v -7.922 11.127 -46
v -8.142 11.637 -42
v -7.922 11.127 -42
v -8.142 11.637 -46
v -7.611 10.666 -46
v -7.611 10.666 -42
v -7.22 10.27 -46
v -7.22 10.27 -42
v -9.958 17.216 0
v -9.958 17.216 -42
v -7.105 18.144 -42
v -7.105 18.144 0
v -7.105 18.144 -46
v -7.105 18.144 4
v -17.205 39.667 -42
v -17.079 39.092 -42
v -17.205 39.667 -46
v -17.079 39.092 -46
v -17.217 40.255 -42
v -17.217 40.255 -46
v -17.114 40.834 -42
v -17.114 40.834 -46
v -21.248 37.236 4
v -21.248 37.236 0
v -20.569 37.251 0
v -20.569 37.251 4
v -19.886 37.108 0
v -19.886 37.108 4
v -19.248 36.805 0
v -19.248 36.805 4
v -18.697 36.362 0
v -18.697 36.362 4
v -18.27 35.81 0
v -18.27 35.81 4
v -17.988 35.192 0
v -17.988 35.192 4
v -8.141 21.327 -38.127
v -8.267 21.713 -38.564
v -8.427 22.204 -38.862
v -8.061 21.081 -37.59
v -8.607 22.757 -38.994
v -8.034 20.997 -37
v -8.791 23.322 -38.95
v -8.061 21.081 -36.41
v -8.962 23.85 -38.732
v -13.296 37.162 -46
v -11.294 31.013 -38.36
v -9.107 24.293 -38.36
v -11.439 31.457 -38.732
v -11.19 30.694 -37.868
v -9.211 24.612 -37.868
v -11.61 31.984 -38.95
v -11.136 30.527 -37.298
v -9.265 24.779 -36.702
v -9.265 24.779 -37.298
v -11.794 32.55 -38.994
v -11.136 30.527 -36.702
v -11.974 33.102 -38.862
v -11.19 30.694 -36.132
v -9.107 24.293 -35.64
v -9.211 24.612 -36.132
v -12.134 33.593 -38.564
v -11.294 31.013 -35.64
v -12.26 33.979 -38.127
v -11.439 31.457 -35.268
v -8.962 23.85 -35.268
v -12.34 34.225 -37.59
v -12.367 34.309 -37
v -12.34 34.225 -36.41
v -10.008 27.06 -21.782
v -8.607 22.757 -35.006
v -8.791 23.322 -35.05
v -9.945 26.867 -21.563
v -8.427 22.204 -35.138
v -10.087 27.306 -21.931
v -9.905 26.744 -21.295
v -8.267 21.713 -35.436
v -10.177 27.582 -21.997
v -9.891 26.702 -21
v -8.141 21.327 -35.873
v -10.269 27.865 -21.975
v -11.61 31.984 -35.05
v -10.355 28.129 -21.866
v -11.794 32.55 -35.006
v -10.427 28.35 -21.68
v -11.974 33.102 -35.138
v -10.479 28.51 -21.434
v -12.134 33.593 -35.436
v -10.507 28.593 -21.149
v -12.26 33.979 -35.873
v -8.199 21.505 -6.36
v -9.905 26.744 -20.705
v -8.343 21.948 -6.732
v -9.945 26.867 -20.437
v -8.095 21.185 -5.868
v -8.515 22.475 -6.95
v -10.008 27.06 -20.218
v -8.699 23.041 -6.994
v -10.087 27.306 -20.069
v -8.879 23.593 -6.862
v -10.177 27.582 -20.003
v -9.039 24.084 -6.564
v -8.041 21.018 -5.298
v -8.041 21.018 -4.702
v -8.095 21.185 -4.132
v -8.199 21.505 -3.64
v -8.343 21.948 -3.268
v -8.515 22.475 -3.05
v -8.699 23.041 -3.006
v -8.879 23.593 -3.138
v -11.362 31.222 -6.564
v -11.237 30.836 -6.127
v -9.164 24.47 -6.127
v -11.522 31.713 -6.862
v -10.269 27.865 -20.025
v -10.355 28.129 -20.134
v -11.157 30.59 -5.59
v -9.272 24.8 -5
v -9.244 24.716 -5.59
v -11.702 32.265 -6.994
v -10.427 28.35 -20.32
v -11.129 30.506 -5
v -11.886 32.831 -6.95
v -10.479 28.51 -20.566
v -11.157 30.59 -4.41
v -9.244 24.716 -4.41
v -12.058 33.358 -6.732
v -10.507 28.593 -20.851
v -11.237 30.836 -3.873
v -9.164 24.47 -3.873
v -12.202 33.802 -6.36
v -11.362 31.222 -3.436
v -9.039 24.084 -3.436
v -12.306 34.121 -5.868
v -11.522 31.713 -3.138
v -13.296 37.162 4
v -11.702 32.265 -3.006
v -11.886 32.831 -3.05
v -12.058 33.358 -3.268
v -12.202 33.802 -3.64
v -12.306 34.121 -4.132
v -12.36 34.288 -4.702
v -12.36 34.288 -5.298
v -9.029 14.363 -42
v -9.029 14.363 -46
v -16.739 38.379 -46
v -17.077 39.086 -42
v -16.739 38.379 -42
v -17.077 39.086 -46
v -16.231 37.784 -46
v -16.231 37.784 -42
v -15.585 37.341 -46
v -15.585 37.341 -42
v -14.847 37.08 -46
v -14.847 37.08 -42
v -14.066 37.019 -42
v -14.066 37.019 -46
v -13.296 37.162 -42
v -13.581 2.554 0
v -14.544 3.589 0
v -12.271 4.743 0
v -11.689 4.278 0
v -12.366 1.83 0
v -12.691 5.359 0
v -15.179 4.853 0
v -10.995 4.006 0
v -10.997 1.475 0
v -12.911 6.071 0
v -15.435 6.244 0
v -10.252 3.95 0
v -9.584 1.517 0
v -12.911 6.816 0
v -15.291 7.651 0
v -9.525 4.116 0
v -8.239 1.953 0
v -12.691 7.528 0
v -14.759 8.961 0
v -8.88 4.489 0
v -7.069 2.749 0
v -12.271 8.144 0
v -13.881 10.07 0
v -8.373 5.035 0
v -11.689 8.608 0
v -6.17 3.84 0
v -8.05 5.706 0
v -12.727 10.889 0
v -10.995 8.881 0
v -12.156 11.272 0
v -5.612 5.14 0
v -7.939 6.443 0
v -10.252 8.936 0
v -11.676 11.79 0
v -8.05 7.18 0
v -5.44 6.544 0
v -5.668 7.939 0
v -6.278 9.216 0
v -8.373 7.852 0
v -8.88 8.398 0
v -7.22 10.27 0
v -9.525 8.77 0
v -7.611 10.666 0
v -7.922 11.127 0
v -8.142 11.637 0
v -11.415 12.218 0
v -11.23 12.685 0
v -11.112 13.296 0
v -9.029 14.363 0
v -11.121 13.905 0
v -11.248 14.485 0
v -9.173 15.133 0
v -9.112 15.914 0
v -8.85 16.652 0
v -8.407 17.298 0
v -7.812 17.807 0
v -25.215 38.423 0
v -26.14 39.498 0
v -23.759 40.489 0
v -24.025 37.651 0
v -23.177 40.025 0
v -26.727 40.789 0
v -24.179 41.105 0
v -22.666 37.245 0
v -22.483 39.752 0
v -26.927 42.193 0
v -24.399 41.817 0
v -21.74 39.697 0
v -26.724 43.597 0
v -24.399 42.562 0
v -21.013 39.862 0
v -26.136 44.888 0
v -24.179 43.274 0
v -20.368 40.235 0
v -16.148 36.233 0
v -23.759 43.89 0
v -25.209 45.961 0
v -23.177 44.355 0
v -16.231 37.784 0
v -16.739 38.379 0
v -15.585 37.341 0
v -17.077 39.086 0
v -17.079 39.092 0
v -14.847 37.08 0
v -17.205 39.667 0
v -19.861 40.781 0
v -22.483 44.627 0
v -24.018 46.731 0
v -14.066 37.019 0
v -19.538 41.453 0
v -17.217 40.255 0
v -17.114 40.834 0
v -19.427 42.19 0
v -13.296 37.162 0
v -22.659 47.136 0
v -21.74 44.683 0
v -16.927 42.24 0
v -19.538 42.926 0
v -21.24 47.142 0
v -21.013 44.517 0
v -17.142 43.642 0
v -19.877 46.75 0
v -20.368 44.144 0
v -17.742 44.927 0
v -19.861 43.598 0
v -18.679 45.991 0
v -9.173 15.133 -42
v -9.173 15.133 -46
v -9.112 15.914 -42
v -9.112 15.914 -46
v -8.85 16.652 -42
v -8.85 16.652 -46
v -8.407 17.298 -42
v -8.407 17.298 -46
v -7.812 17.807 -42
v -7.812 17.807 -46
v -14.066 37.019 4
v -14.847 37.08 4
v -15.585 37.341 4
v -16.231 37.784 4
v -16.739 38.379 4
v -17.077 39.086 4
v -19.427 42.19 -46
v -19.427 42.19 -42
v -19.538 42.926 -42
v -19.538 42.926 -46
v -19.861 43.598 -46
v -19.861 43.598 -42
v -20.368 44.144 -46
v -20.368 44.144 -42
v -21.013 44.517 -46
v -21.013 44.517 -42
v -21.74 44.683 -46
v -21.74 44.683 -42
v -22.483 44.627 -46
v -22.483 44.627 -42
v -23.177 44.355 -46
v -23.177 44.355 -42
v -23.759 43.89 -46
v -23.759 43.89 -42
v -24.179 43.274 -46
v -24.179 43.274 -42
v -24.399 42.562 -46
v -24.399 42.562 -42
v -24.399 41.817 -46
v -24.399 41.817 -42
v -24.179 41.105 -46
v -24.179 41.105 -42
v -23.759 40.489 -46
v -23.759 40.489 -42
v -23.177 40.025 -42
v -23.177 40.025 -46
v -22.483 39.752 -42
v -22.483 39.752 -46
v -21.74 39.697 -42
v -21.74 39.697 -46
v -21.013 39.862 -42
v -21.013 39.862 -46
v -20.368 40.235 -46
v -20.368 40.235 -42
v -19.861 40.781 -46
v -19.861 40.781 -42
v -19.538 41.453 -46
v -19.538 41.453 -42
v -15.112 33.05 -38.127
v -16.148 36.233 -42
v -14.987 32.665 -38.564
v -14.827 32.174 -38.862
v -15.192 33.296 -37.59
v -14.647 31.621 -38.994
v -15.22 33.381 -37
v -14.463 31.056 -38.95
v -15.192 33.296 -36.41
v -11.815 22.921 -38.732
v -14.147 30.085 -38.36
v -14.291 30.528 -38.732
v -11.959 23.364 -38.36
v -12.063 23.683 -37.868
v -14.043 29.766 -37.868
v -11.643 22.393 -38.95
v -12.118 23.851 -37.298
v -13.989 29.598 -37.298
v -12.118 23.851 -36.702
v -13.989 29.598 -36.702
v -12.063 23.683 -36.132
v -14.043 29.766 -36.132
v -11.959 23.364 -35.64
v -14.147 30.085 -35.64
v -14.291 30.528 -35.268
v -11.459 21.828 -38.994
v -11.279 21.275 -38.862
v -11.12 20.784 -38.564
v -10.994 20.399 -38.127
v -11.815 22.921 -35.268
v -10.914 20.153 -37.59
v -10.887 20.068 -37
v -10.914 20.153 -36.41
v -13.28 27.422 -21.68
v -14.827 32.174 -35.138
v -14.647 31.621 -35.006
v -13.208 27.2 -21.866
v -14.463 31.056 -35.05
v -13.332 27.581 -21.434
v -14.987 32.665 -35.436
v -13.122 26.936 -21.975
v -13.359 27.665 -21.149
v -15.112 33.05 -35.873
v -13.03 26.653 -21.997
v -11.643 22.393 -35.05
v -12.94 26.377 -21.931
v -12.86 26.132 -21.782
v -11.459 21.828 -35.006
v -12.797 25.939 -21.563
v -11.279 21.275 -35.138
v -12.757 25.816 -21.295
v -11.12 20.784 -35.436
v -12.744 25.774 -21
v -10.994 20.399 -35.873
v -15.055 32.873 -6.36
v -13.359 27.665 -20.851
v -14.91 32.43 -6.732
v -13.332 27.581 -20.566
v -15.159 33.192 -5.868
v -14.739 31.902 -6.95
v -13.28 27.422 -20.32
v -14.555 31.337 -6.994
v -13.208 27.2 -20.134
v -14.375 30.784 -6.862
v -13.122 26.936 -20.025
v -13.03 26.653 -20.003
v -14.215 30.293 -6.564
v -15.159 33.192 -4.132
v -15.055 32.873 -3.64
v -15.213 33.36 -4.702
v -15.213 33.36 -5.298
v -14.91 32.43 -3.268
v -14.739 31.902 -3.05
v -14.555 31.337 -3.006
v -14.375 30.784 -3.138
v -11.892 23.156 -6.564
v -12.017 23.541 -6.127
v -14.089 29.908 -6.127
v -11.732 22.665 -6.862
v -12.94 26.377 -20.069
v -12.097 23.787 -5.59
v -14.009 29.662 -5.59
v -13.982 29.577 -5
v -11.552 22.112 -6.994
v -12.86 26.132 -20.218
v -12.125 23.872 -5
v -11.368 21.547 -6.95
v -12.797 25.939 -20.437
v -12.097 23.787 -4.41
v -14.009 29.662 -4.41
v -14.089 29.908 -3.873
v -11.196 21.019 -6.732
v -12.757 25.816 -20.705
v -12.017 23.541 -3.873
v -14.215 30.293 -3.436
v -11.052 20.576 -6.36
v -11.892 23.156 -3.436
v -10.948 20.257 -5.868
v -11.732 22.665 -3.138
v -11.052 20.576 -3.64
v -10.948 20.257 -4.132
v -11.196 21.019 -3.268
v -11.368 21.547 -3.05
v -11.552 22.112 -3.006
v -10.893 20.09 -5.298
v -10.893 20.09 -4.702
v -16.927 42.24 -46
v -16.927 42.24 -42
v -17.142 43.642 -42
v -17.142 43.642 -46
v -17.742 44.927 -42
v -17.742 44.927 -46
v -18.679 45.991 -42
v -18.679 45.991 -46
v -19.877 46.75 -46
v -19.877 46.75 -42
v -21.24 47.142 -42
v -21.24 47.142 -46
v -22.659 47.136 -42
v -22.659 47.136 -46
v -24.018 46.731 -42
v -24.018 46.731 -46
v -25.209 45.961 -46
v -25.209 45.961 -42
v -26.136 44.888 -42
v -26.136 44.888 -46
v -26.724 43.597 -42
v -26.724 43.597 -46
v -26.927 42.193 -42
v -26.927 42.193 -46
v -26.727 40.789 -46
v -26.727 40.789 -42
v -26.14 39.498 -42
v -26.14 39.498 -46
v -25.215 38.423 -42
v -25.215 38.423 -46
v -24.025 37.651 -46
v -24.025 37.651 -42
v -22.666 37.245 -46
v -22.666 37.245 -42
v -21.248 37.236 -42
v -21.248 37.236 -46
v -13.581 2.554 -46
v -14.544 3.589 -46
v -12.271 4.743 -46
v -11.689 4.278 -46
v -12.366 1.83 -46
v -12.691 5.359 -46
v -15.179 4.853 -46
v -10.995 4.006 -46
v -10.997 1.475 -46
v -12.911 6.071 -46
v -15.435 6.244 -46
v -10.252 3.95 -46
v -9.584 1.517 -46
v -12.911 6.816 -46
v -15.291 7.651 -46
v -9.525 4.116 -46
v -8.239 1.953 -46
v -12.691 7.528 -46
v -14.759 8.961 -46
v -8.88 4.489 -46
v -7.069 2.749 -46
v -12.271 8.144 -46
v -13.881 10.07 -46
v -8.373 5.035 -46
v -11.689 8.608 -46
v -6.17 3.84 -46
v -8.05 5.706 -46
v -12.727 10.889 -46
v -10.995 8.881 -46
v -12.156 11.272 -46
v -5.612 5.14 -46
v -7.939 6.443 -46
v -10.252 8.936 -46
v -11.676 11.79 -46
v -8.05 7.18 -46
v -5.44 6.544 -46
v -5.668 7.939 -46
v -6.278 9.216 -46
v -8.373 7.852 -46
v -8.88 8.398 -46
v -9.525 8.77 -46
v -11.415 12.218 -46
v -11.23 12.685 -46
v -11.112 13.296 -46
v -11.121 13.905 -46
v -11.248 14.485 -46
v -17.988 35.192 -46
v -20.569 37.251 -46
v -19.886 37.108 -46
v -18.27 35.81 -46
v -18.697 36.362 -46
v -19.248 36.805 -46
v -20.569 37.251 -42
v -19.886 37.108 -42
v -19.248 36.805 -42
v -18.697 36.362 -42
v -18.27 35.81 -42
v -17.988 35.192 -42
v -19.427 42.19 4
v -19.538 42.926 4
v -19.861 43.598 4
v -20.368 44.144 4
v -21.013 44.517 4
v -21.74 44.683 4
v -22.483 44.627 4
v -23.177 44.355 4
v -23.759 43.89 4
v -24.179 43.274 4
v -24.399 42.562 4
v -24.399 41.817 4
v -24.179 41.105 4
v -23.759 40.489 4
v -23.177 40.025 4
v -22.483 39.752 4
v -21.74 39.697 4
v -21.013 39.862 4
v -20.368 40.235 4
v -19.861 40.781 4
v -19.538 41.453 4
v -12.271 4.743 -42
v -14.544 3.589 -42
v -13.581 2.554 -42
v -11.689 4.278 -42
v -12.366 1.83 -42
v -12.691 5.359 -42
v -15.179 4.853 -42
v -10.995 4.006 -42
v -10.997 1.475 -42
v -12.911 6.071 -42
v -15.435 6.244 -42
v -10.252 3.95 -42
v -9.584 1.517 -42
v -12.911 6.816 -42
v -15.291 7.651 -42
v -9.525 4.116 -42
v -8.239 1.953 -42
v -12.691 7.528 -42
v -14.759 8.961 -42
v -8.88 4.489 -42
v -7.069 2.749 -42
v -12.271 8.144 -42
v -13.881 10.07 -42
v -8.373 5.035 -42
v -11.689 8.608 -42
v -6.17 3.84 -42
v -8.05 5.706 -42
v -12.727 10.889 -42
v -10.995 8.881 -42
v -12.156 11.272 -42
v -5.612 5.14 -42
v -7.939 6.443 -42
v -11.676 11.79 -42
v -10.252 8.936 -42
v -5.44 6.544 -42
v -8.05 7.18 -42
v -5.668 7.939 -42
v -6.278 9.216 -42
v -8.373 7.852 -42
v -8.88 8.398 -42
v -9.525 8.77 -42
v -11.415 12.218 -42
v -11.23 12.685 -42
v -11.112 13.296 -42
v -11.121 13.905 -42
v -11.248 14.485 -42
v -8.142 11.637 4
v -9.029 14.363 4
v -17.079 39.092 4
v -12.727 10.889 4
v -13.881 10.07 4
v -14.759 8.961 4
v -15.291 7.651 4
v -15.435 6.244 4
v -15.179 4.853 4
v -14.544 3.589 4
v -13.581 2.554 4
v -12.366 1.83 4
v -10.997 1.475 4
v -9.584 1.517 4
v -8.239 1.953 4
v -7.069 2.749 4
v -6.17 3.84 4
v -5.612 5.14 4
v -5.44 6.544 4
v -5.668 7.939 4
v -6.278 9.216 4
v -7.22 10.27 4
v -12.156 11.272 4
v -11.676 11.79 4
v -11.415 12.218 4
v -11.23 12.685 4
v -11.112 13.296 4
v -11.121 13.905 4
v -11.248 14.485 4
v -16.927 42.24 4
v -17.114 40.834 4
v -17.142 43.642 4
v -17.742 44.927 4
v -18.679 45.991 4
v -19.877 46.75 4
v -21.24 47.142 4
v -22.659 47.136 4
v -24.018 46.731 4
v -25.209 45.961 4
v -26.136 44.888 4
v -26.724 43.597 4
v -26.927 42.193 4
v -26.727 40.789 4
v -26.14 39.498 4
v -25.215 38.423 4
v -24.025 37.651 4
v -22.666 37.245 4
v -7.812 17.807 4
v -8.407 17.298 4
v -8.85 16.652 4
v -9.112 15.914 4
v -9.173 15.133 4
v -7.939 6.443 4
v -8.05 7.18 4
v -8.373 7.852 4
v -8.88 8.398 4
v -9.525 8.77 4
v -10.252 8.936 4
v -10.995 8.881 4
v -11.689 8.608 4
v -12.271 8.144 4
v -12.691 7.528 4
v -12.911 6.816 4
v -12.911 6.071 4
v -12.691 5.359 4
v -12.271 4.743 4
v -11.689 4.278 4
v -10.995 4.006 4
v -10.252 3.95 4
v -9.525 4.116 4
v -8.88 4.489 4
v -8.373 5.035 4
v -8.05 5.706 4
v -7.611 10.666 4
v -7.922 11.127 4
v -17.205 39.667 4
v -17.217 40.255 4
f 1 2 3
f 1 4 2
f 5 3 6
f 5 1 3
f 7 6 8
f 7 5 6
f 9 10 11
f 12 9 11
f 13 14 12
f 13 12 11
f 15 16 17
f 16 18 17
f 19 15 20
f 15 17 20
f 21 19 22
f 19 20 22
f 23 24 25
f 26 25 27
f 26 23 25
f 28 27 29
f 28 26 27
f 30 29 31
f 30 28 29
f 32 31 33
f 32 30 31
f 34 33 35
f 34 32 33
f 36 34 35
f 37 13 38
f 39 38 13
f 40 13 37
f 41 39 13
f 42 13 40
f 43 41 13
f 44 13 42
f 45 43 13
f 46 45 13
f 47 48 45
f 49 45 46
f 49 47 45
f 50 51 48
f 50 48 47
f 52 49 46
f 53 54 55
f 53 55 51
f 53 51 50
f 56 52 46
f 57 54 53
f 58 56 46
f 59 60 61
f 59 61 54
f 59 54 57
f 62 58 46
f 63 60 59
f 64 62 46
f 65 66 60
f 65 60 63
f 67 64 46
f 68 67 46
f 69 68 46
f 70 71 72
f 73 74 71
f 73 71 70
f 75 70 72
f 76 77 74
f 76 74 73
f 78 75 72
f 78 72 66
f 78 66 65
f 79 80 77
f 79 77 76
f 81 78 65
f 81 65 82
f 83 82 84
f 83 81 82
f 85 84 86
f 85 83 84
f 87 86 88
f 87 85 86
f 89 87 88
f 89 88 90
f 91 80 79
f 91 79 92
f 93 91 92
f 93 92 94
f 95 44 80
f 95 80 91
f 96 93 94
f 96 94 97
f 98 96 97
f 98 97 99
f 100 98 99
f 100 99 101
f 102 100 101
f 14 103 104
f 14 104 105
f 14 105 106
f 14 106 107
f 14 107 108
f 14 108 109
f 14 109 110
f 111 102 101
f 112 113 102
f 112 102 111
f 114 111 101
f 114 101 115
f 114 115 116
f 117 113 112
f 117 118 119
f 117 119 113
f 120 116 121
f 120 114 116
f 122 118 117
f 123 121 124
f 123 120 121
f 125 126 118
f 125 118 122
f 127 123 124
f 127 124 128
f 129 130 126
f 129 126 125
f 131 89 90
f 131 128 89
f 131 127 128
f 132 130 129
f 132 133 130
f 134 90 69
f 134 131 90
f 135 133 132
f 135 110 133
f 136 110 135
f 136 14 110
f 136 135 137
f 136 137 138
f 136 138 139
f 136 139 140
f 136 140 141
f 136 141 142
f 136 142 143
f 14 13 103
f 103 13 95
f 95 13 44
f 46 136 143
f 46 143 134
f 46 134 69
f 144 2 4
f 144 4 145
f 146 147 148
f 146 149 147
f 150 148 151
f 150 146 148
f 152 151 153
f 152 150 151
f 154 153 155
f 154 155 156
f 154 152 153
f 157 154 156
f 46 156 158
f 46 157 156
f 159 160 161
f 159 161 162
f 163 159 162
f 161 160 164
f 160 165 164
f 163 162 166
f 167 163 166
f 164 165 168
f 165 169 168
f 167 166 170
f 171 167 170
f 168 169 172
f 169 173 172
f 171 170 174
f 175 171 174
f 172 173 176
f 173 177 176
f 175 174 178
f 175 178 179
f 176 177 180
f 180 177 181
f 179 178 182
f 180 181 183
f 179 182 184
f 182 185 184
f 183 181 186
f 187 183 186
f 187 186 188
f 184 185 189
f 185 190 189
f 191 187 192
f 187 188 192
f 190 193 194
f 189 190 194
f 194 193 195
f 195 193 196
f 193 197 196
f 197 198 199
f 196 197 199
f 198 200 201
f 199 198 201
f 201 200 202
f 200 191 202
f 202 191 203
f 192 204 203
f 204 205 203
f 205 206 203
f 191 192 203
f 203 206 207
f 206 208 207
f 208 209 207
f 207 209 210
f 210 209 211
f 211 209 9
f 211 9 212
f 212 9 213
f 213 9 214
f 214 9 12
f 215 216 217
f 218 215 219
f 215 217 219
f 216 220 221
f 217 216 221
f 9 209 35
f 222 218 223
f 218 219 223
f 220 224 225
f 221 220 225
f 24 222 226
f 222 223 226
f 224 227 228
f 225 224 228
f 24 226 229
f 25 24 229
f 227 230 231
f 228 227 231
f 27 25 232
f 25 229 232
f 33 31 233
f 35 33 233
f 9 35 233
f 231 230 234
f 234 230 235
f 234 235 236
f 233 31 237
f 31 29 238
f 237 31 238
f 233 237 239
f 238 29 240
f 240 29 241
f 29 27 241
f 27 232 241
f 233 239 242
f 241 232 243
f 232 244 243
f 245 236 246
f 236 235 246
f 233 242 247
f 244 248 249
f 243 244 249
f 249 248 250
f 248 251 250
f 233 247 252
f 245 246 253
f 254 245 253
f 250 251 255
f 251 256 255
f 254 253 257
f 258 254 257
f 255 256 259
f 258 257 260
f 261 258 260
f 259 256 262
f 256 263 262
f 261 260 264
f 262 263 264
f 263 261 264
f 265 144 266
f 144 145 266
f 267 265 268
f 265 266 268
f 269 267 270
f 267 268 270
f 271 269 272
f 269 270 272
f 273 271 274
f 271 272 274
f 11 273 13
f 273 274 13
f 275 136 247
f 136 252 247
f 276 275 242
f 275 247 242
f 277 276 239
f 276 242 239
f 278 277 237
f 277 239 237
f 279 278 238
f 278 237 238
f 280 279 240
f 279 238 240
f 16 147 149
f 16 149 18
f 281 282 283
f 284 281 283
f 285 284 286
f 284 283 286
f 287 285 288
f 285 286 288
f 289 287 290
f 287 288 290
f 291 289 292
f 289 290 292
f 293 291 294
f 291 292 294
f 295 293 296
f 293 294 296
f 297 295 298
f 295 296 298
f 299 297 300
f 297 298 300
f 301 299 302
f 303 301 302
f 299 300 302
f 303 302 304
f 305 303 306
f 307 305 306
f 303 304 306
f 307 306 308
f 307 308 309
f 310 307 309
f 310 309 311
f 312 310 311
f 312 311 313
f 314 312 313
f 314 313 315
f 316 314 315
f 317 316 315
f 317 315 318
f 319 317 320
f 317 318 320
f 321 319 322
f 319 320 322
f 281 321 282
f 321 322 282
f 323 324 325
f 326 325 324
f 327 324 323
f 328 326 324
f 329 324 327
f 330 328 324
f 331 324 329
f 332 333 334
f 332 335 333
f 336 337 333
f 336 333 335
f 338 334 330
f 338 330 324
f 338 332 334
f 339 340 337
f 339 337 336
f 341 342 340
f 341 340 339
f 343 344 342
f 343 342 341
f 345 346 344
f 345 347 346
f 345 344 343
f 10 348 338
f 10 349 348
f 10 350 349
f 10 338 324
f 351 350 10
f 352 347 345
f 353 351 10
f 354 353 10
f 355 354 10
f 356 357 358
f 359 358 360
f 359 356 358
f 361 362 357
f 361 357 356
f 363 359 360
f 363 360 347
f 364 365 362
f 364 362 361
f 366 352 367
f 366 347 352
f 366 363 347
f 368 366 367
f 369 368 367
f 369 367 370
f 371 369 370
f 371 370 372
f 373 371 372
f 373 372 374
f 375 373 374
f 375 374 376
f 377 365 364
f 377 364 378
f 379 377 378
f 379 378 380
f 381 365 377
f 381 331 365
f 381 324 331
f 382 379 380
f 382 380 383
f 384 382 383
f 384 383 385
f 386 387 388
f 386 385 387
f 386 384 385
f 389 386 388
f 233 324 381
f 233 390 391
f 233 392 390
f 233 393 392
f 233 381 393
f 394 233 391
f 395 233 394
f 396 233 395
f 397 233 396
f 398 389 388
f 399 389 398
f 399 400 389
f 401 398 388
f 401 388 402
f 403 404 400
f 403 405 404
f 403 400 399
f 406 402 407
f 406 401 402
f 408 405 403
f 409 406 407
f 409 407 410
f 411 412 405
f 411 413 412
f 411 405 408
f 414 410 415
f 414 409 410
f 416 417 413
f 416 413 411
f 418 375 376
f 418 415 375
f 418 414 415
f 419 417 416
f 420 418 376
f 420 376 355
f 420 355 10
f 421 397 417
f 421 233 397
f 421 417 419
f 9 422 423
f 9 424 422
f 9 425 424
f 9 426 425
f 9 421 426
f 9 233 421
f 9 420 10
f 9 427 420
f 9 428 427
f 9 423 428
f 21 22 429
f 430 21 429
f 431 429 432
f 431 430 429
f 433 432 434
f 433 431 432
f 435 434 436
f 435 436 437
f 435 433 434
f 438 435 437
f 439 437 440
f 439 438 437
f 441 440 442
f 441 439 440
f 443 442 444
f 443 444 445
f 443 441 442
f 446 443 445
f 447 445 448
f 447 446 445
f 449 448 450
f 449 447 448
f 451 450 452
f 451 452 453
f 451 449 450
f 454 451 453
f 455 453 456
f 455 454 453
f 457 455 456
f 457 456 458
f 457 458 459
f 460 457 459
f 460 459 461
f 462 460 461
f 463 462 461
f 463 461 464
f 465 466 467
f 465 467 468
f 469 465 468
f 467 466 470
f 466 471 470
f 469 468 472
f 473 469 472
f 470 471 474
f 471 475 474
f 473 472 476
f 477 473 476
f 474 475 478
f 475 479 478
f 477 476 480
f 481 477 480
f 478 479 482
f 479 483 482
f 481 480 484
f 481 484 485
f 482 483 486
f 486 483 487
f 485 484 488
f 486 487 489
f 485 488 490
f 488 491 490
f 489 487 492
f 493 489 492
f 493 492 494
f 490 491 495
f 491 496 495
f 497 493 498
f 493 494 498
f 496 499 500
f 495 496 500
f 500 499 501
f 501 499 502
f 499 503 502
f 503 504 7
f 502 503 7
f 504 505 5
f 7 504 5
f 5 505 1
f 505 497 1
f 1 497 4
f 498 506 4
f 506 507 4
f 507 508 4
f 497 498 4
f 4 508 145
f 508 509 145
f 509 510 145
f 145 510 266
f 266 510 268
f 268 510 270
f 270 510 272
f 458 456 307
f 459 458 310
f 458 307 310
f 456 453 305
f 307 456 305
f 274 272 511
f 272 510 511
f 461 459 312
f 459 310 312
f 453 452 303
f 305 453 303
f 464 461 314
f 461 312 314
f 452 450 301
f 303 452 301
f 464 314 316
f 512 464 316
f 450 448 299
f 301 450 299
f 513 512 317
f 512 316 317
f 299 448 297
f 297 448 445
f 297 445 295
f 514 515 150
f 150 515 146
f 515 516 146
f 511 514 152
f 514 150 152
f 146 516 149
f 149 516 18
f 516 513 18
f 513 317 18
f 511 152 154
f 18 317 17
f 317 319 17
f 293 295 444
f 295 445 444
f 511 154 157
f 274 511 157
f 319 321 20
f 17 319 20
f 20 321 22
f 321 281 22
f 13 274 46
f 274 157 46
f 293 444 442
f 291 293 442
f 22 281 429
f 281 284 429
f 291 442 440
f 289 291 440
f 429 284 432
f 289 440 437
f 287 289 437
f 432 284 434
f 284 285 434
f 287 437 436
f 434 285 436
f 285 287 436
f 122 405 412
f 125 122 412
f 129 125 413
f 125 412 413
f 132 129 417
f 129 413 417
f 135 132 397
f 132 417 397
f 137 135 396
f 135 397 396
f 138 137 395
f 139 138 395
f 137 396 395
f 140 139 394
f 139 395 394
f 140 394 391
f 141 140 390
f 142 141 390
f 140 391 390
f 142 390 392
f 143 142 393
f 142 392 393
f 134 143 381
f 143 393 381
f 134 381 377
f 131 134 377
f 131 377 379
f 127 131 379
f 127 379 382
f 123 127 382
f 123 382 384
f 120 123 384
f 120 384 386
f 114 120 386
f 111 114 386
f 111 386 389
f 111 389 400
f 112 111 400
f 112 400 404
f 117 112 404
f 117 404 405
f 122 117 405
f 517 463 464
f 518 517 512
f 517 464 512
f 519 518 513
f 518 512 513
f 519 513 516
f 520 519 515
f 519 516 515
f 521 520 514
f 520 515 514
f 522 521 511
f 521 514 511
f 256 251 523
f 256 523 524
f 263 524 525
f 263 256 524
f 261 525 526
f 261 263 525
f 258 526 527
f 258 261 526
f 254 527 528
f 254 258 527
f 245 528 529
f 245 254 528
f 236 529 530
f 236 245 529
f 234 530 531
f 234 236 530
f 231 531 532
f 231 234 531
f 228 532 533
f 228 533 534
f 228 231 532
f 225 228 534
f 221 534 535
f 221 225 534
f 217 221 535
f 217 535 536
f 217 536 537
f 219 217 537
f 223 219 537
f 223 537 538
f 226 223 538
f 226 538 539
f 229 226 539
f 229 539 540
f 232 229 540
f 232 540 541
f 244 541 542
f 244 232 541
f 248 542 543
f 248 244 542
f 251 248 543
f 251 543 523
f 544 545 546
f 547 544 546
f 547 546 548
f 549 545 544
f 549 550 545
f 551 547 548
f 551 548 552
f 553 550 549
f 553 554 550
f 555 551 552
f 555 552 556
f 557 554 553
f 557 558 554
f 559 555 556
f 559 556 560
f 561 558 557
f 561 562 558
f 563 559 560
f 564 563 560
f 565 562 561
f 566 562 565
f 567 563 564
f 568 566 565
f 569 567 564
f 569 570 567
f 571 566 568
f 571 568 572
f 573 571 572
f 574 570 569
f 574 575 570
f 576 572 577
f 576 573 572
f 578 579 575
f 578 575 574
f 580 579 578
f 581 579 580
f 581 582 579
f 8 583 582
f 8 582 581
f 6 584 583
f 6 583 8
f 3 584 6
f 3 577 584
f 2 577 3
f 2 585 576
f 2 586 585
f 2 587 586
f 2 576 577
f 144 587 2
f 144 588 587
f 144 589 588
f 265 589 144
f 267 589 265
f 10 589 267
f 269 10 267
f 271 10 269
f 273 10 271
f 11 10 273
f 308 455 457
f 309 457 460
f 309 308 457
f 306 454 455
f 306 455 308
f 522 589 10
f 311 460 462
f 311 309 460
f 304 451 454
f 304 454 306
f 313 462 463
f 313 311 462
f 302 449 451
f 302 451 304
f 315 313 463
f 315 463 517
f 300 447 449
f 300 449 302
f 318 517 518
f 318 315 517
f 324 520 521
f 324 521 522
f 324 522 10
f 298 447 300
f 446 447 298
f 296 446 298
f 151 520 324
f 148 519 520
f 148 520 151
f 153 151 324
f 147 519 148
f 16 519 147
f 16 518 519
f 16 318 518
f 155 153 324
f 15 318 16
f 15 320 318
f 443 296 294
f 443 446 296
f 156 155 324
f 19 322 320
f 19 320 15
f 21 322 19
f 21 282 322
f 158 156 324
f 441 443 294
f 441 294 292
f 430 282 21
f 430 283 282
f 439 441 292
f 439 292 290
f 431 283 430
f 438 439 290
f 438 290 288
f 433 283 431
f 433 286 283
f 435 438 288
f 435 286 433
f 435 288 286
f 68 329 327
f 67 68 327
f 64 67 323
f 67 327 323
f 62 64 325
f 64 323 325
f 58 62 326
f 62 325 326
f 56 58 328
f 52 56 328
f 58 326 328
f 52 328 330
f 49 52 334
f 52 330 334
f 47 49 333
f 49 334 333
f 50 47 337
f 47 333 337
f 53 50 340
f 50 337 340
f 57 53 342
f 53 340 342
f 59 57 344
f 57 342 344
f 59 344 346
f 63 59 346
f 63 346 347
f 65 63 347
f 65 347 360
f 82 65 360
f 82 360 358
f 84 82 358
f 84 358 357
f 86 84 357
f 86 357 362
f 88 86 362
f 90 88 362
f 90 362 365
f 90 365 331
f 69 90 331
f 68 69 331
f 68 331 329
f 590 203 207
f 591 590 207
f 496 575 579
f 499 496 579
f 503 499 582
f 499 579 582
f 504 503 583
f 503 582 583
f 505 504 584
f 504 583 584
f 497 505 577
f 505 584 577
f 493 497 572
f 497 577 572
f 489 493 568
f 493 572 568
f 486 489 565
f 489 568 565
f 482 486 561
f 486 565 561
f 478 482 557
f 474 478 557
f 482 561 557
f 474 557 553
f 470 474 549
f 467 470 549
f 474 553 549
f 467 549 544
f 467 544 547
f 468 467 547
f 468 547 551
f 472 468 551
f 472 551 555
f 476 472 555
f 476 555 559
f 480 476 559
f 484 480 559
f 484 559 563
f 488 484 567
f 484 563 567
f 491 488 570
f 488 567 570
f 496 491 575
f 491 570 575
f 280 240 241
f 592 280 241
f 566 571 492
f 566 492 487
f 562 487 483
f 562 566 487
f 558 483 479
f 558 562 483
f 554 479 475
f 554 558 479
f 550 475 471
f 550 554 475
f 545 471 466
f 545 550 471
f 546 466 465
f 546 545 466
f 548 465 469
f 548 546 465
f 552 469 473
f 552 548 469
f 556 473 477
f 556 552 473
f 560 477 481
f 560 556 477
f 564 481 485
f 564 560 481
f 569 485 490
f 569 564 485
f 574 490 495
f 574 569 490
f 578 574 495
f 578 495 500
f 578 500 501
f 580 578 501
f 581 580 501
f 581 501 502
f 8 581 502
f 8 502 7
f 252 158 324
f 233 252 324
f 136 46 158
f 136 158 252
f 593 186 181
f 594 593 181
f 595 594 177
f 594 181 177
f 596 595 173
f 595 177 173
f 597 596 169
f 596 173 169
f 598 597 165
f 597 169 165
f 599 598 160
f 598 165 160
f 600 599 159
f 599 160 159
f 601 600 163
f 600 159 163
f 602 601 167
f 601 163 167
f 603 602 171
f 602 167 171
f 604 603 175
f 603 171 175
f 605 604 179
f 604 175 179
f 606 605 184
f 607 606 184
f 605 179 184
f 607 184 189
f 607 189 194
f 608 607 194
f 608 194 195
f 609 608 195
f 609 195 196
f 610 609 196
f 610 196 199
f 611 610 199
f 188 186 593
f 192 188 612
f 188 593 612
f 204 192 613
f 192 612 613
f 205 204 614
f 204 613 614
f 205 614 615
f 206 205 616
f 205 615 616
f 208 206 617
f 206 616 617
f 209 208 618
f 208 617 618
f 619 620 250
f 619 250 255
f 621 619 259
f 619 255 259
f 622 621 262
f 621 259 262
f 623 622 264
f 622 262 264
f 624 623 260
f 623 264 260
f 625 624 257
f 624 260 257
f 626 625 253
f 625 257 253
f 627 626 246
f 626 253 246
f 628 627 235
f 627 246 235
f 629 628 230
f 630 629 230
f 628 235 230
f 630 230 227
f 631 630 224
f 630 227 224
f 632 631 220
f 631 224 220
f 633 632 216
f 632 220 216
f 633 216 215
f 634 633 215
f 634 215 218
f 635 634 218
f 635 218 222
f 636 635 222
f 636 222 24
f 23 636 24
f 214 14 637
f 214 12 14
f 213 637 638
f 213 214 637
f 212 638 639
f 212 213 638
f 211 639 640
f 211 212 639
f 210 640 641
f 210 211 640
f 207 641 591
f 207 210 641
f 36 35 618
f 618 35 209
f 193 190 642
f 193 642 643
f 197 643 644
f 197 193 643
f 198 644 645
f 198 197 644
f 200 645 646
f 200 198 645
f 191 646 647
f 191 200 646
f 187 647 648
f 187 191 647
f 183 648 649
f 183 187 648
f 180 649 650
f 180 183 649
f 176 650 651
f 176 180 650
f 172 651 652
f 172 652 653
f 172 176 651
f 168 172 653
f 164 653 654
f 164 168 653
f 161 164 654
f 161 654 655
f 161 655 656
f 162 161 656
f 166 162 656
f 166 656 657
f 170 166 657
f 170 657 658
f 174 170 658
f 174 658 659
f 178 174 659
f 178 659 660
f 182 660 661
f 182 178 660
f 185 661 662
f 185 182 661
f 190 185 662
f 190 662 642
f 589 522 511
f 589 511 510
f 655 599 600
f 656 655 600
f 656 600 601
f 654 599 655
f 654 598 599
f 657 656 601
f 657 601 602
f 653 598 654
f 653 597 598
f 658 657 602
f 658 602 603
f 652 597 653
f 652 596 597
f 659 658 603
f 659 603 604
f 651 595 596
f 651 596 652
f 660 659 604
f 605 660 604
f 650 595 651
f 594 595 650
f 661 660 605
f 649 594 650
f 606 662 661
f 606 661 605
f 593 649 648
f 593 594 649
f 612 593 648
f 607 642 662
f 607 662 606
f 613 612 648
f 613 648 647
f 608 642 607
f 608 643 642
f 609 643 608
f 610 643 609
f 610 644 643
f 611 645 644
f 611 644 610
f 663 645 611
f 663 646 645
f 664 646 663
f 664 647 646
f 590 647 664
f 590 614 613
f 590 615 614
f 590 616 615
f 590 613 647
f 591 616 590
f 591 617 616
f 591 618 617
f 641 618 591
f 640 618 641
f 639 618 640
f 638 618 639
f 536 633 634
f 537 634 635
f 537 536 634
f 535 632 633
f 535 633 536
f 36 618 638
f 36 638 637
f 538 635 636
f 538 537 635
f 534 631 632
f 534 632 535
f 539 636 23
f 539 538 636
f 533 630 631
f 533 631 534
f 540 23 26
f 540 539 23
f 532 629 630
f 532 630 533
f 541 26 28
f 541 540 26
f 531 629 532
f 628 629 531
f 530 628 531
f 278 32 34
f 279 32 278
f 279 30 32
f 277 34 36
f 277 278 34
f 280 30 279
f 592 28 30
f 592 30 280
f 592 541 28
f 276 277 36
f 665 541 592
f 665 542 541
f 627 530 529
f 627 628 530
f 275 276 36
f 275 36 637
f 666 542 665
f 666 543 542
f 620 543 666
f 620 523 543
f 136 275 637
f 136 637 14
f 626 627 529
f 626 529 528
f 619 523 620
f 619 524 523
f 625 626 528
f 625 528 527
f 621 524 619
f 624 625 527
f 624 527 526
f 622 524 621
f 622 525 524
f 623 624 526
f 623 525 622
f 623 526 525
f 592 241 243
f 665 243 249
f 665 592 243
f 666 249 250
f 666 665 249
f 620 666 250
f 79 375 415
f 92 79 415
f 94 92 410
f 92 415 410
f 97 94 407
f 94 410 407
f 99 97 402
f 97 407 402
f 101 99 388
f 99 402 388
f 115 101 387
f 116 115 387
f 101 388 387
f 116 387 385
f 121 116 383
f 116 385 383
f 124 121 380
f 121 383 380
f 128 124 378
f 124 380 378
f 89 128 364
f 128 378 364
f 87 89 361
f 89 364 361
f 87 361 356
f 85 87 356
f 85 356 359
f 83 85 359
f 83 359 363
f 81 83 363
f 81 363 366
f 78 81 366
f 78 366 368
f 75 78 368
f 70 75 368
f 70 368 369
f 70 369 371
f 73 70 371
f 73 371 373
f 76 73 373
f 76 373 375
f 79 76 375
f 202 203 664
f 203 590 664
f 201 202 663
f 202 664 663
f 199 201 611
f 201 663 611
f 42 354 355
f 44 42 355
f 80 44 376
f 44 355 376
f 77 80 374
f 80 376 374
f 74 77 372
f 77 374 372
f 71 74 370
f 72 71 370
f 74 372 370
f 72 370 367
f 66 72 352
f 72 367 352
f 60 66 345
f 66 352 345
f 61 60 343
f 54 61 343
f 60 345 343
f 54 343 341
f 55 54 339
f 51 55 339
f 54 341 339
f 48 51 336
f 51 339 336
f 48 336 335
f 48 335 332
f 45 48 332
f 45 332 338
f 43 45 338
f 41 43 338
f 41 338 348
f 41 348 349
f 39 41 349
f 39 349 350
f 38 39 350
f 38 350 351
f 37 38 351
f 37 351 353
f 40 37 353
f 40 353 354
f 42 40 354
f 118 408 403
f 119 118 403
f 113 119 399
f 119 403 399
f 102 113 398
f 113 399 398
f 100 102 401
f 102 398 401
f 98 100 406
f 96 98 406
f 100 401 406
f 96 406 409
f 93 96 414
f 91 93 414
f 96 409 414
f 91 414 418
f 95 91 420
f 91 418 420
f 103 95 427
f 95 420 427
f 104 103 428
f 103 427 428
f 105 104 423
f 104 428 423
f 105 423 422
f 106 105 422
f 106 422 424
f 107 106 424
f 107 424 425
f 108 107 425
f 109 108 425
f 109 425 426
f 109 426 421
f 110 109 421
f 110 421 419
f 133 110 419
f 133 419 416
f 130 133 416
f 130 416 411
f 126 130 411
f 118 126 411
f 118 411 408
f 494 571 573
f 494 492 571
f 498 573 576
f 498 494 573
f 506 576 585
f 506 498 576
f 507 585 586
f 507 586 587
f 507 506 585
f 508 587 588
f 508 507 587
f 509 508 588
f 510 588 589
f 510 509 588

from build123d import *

# Parameters (mm, degrees)
SKETCH1_R           = 2.5
BOSS_EXTRUDE1_DEPTH = 4
BOSS_EXTRUDE2_DEPTH = 50
SKETCH3_R           = 2
SKETCH3_R_2         = 1
CUT_EXTRUDE1_DEPTH  = 10
FILLET1_R           = 3


with BuildPart() as part:
    # Sketch1 → Boss-Extrude1 (new body)
    with BuildSketch(Plane.XY):
        with BuildLine():
            Line((-7.842362425, 10.716234493), (-17.397624454, 40.071064625))
            ThreePointArc((-17.397624454, 40.071064625), (-25.795005306, 45.357497095), (-18.956793202, 38.167140452))
            Line((-18.956793202, 38.167140452), (-18.754238897, 37.544871045))
            Line((-18.754238897, 37.544871045), (-10.63810017, 12.611188123))
            Line((-10.63810017, 12.611188123), (-10.256851829, 11.439950722))
            ThreePointArc((-10.256851829, 11.439950722), (-11.874437039, 1.653788416), (-7.842362425, 10.716234493))
        make_face()
        with Locations((-10.438845238, 6.44326398)):
            Circle(SKETCH1_R, mode=Mode.SUBTRACT)
        with Locations((-21.926625837, 42.189589224)):
            Circle(SKETCH1_R, mode=Mode.SUBTRACT)
    boss_extrude1 = extrude(amount=BOSS_EXTRUDE1_DEPTH)

    # Sketch2 → Boss-Extrude2 (add)
    with BuildSketch(Plane.XY.offset(4)):
        Polygon((-16.14843876, 36.233426921), (-9.957962302, 17.215593153), (-7.105287237, 18.144164622), (-13.295763695, 37.161998389), align=None)
    extrude(amount=-BOSS_EXTRUDE2_DEPTH)

    # Mirror1: Boss-Extrude1 across plane
    add(boss_extrude1.mirror(Plane.XY.offset(-21)))

    # Sketch3 → Cut-Extrude1 (cut)
    with BuildSketch(Plane(origin=(-3.936983875, -1.281523768, 0), x_dir=(0, 0, 1), z_dir=(-0.950891688393093, -0.30952382290371966, 0))):
        with Locations(Location((-5, 34.452391, 0), (0, 0, 270))):
            Circle(SKETCH3_R)
        with Locations(Location((-5, 24.452391, 0), (0, 0, 90))):
            Circle(SKETCH3_R)
        with Locations(Location((-37, 24.452391, 0), (0, 0, 270))):
            Circle(SKETCH3_R)
        with Locations(Location((-37, 34.452391, 0), (0, 0, 90))):
            Circle(SKETCH3_R)
        with Locations(Location((-21, 29.452391, 0), (0, 0, 270))):
            Circle(SKETCH3_R_2)
    extrude(amount=-CUT_EXTRUDE1_DEPTH, mode=Mode.SUBTRACT)

    # Fillet1
    fillet1_edges = [part.edges().sort_by_distance(p)[0] for p in [
        (-9.957962302, 17.215593153, 2),
        (-9.957962302, 17.215593153, -44),
        (-16.14843876, 36.233426921, -44),
        (-16.14843876, 36.233426921, 2),
        (-10.256851829, 11.439950722, 2),
        (-7.842362425, 10.716234493, 2),
        (-7.842362425, 10.716234493, -44),
        (-10.256851829, 11.439950722, -44),
        (-17.397624454, 40.071064625, -44),
        (-18.956793202, 38.167140452, -44),
        (-17.397624454, 40.071064625, 2),
        (-18.956793202, 38.167140452, 2),
    ]]
    fillet(fillet1_edges, radius=FILLET1_R - 0.0001)  # a hair under: the kernel refuses the full size


solid = part.part
